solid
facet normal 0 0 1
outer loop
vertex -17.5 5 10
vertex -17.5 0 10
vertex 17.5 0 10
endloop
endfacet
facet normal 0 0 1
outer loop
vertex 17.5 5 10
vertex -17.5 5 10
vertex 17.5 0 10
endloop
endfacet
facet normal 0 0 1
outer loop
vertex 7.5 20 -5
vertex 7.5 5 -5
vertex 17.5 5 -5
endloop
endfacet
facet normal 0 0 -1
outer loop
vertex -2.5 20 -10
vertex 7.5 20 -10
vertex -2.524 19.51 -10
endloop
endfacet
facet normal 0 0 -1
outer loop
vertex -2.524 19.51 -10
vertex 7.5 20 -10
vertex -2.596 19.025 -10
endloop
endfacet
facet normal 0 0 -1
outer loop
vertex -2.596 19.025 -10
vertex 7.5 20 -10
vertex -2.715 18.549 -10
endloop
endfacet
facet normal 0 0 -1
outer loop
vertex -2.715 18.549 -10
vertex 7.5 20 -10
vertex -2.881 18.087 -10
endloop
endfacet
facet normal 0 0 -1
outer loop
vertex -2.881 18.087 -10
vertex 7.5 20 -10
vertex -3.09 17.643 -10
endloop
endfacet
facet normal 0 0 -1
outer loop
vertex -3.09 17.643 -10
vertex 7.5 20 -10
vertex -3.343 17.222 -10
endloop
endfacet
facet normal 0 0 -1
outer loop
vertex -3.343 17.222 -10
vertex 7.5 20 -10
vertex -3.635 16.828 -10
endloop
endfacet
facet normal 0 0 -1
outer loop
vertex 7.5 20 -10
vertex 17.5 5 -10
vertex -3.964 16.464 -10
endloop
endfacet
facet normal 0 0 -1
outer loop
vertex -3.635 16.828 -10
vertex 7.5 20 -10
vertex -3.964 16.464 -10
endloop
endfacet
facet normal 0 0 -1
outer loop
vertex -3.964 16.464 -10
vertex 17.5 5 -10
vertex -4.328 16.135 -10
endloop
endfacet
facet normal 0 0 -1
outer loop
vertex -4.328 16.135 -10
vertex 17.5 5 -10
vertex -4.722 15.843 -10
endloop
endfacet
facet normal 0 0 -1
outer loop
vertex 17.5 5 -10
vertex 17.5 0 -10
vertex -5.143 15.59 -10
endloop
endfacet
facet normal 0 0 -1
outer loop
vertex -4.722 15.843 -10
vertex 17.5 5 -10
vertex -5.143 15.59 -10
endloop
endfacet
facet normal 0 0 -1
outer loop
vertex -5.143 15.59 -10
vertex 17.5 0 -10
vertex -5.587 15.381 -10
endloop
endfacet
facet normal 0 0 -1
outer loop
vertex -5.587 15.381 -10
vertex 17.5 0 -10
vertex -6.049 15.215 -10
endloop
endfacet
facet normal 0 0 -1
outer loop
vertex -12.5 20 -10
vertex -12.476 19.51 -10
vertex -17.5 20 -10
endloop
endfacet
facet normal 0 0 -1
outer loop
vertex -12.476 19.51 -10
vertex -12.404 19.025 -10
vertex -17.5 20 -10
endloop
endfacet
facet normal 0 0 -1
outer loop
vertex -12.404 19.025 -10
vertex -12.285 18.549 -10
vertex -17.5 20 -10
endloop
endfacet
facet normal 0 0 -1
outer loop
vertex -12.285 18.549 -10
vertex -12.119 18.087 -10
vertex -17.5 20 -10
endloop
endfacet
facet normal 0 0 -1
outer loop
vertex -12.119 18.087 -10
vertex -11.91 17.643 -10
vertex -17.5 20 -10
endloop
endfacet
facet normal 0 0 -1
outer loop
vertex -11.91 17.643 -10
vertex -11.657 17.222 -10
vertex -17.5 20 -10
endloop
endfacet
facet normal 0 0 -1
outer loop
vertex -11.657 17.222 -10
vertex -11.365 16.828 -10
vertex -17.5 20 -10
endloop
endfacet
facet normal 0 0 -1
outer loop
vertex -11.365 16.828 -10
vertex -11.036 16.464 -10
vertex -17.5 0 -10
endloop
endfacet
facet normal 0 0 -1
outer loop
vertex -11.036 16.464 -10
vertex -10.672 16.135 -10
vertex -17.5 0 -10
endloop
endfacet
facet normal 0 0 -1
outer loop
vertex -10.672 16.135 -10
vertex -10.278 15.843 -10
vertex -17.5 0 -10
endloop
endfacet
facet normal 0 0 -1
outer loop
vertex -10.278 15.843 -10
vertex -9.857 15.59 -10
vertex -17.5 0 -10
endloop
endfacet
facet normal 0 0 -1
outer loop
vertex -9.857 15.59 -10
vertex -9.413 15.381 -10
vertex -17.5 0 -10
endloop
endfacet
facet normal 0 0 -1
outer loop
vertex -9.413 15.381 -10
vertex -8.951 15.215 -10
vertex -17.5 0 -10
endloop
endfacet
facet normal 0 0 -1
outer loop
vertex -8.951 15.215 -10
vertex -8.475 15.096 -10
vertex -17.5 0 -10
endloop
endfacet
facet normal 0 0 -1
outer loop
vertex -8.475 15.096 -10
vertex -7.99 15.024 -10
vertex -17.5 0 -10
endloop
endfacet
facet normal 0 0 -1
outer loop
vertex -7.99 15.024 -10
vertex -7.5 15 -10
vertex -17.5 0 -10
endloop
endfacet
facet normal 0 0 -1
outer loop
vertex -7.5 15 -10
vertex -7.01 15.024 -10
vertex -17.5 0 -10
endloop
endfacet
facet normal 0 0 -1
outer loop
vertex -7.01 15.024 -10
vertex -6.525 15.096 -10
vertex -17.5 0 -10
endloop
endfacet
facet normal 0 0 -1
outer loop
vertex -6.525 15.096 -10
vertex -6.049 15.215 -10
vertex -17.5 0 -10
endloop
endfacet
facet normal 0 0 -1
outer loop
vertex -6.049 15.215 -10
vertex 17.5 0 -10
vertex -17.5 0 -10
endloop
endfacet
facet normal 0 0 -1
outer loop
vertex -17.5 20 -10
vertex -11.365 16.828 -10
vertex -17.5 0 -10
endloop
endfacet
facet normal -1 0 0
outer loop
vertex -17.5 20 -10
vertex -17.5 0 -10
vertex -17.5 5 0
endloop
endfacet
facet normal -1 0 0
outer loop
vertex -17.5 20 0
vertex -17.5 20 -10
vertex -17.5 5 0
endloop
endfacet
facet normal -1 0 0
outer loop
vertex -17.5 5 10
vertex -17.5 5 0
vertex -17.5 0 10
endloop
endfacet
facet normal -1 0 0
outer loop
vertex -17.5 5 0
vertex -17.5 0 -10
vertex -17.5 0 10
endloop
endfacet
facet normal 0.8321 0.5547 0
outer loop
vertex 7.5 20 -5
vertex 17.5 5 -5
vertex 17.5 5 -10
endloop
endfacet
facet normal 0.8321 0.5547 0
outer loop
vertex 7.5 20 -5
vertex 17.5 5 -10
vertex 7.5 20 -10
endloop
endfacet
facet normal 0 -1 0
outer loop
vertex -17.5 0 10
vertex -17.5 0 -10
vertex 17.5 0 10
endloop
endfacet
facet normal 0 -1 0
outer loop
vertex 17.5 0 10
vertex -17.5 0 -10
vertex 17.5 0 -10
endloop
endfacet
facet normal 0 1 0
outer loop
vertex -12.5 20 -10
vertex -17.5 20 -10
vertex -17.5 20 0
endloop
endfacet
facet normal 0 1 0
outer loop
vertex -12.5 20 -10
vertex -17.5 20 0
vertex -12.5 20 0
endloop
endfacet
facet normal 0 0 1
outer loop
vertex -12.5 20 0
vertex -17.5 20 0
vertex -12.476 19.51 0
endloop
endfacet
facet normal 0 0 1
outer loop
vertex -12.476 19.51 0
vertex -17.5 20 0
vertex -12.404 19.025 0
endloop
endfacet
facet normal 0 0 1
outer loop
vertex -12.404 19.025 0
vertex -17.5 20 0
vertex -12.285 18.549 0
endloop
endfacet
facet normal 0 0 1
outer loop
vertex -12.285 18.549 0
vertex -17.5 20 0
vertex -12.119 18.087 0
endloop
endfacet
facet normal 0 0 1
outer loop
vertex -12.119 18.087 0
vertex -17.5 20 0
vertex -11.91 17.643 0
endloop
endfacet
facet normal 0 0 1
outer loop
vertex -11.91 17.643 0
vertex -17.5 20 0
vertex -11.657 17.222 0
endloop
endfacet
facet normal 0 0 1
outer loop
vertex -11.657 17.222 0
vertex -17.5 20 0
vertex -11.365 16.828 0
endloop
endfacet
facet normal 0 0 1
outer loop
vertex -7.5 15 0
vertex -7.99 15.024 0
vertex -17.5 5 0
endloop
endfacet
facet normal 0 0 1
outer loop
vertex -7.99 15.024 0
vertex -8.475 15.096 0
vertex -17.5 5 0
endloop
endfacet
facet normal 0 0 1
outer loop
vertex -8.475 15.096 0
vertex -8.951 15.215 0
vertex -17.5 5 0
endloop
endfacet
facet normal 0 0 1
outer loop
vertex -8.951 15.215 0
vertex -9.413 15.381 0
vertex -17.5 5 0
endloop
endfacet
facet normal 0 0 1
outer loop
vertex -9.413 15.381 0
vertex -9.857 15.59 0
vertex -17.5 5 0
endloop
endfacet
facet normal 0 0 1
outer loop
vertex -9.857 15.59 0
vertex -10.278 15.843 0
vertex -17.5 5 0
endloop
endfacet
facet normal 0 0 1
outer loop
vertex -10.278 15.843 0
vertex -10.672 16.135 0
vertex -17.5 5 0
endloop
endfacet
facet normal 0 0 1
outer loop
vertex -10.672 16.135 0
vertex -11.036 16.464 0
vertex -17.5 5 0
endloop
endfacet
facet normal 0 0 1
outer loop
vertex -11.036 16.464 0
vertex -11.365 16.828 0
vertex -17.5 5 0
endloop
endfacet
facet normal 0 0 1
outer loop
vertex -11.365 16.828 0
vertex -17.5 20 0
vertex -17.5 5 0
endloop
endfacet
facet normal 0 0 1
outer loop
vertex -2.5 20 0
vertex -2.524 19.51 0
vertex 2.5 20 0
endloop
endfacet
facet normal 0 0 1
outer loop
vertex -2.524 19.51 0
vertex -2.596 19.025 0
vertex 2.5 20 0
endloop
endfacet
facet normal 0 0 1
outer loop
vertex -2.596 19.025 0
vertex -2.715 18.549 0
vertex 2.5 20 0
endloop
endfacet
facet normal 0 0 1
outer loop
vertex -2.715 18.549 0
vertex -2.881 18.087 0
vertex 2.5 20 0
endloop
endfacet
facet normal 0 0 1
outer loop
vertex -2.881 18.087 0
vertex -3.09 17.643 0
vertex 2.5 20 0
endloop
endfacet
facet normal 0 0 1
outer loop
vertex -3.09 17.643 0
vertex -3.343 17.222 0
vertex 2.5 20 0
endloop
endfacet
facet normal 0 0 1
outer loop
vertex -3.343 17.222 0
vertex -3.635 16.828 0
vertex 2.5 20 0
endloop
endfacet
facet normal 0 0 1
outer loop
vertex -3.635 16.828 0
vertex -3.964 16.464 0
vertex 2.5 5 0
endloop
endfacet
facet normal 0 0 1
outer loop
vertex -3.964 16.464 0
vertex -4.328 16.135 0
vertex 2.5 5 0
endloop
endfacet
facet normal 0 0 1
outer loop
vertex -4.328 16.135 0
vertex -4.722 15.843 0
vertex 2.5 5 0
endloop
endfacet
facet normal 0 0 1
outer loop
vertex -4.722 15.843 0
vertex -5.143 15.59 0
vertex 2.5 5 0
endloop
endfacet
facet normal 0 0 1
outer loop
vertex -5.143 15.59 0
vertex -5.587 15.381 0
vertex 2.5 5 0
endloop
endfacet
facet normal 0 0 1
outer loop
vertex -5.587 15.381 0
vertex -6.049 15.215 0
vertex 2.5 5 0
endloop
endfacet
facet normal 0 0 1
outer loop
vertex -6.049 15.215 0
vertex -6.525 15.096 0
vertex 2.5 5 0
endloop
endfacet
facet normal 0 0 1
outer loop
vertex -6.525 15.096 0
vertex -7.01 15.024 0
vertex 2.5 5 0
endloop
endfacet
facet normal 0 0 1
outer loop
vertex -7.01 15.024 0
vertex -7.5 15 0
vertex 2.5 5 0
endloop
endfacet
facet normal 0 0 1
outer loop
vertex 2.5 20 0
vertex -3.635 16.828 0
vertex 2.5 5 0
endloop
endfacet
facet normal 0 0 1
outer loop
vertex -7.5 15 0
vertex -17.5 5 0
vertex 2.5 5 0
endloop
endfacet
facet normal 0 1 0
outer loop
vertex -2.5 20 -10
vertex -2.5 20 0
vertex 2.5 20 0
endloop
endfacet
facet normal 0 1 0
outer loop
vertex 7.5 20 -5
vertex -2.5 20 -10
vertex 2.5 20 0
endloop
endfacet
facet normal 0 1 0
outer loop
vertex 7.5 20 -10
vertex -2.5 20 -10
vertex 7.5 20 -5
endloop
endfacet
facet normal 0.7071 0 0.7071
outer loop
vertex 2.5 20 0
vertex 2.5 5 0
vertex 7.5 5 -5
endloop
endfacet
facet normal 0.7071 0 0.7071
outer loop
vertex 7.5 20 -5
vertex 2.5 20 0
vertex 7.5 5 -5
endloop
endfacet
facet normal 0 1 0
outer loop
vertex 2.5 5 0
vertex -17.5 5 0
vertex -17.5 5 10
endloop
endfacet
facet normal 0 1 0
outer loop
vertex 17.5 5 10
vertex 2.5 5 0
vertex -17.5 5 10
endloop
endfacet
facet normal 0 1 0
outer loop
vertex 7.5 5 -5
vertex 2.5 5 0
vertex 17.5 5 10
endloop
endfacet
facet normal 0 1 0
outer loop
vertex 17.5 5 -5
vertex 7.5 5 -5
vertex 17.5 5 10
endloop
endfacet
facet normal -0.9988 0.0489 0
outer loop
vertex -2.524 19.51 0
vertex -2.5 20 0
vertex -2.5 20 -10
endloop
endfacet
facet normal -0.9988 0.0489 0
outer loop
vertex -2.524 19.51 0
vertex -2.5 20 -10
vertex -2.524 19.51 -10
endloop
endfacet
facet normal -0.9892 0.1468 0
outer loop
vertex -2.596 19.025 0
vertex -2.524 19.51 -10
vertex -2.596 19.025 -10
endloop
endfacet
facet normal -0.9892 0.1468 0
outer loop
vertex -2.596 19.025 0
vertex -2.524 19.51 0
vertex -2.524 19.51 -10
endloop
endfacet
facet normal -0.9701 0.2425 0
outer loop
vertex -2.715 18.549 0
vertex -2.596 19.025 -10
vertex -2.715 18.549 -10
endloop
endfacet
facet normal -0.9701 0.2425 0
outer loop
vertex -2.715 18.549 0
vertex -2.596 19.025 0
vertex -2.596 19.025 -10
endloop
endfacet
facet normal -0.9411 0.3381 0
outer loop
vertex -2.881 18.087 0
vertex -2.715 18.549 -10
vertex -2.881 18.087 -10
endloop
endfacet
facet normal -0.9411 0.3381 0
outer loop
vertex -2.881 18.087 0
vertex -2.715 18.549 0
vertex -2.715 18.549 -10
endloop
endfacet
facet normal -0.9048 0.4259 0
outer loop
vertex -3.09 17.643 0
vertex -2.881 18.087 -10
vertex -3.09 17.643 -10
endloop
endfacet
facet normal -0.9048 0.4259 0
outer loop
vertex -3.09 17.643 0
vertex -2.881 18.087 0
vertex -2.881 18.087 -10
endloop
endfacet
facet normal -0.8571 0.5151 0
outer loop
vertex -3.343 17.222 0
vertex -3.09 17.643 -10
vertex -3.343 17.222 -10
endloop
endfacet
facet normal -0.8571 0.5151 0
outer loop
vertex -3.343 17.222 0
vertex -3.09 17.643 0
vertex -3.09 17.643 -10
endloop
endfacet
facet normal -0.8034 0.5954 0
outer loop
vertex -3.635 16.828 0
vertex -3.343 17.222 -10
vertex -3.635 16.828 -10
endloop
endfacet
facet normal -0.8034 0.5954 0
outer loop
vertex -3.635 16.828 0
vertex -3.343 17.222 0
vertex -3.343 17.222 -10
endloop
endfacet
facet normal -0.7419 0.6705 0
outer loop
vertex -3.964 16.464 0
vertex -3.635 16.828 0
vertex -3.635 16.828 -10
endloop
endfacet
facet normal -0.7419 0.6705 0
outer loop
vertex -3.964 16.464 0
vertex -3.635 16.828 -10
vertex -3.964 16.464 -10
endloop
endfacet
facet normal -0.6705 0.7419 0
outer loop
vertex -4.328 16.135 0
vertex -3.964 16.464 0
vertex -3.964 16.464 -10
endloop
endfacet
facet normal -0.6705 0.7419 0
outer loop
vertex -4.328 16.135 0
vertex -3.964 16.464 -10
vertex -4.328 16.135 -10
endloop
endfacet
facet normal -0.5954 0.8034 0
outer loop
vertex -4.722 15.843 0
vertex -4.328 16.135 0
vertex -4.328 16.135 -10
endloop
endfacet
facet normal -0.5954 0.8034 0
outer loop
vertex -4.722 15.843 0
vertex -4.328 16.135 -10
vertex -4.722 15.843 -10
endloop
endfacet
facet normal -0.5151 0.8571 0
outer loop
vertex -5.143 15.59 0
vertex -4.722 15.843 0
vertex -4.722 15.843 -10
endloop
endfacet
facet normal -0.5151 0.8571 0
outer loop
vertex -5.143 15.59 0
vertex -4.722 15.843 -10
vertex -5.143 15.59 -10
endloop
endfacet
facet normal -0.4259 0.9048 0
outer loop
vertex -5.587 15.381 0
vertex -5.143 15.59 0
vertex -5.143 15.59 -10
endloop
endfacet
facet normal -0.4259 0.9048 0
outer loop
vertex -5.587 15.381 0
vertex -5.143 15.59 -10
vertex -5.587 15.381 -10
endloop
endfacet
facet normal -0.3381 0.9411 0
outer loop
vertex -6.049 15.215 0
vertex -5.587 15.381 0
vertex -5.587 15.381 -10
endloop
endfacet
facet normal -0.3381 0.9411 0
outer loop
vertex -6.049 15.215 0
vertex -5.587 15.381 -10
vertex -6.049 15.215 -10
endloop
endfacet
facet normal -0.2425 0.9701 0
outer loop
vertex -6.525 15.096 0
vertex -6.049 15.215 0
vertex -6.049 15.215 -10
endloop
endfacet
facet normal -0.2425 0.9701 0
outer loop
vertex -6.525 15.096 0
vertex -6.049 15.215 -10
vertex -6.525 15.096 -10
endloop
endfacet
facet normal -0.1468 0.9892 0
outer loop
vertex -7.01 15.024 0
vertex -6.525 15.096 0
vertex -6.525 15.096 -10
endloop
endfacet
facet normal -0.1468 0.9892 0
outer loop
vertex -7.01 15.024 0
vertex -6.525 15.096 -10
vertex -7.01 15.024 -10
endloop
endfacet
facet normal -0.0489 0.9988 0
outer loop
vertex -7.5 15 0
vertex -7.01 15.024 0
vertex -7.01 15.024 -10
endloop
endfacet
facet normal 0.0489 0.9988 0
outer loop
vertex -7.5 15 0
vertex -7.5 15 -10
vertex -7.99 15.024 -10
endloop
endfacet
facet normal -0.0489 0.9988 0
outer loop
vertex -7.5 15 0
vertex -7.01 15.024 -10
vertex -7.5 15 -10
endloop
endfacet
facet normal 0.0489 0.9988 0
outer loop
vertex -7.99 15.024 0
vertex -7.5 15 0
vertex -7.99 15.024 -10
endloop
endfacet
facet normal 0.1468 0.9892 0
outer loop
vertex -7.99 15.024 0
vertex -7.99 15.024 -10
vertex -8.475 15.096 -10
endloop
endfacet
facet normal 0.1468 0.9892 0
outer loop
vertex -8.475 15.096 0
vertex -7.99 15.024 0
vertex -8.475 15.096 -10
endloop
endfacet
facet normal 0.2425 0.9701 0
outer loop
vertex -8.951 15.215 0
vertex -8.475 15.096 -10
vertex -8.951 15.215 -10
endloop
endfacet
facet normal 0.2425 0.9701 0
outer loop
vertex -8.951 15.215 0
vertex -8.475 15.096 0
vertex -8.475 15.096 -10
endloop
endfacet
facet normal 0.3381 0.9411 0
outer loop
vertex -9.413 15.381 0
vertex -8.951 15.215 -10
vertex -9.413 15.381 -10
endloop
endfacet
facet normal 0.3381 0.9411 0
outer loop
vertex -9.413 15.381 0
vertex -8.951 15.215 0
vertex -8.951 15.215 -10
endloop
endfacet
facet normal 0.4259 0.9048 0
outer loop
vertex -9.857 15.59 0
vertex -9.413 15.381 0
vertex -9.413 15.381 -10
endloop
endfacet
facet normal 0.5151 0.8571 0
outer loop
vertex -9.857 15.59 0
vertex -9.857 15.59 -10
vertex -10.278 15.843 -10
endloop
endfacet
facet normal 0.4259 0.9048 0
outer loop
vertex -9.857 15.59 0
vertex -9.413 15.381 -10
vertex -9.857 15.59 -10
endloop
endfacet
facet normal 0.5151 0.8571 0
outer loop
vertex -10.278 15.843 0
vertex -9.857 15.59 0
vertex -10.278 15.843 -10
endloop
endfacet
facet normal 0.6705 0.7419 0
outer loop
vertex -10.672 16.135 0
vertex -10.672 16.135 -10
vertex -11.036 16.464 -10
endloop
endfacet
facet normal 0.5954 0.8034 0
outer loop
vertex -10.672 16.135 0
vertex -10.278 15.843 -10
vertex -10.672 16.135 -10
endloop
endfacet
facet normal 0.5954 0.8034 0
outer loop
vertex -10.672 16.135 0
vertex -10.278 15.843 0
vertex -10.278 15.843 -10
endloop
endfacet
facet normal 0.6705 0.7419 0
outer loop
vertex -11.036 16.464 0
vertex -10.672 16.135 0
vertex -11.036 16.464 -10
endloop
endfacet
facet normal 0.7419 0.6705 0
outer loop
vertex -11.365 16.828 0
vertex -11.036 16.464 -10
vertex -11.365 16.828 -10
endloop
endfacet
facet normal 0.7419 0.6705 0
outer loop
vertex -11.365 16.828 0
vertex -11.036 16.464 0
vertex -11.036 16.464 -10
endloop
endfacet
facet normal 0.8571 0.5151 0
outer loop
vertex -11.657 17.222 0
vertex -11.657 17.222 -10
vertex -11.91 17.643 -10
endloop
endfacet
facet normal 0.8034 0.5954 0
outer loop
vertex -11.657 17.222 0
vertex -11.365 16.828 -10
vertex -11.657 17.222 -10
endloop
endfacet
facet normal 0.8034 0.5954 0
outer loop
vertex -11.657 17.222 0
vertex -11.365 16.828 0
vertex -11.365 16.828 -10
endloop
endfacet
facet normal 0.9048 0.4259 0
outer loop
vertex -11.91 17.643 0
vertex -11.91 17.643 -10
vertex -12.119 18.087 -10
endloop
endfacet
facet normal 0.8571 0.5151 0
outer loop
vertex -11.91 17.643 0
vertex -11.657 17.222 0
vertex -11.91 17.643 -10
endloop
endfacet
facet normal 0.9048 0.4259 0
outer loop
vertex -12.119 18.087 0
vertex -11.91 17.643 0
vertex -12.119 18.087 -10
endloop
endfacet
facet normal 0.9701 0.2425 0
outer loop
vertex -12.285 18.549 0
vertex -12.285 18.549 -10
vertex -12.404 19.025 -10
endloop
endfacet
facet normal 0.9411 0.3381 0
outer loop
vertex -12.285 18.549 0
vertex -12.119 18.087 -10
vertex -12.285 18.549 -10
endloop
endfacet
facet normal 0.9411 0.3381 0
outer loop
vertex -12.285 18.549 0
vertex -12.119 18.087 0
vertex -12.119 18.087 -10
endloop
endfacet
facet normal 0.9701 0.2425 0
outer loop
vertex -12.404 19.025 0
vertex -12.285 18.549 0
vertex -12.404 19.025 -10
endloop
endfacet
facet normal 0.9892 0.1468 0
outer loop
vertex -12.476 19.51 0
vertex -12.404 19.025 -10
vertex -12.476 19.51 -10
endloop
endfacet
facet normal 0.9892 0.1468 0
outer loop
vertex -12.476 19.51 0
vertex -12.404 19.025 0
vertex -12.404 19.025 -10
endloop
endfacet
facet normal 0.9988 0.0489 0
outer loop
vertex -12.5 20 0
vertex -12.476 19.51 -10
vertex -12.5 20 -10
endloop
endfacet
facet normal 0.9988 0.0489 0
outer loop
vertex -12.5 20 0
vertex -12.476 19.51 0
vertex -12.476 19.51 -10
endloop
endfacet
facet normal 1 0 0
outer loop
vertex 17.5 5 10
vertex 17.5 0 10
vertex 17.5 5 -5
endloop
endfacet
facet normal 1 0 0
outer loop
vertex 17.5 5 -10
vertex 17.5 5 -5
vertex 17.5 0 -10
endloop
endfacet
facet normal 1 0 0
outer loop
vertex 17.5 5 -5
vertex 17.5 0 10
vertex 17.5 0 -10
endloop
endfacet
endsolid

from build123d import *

# Parameters (mm, degrees)
SKETCH_1_W          = 35
SKETCH_1_H          = 20
EXTRUDE_1_DEPTH     = 5
EXTRUDE_2_DEPTH     = 20
CUT_EXTRUDE_1_DEPTH = 20


with BuildPart() as part:
    # 草圖1 → 填料-伸長1 (new body)
    with BuildSketch(Plane(origin=(0, 0, 0), x_dir=(1, 0, 0), z_dir=(0, 1, 0))):
        Rectangle(SKETCH_1_W, SKETCH_1_H)
    extrude(amount=EXTRUDE_1_DEPTH)

    # 草圖1<3> → 填料-伸長2 (add)
    with BuildSketch(Plane(origin=(0, 0, 0), x_dir=(1, 0, 0), z_dir=(0, 1, 0))):
        Polygon((2.5, 0), (7.5, 5), (17.5, 5), (17.5, 10), (-17.5, 10), (-17.5, 0), align=None)
    extrude(amount=EXTRUDE_2_DEPTH)

    # 草圖2 → 除料-伸長1 (cut)
    with BuildSketch(Plane.XY):
        with BuildLine():
            Line((-12.5, 20), (-2.5, 20))
            ThreePointArc((-2.5, 20), (-7.5, 15), (-12.5, 20))
        make_face()
        Polygon((17.5, 5), (7.5, 20), (17.5, 20), align=None)
    extrude(amount=-CUT_EXTRUDE_1_DEPTH, mode=Mode.SUBTRACT)


solid = part.part
